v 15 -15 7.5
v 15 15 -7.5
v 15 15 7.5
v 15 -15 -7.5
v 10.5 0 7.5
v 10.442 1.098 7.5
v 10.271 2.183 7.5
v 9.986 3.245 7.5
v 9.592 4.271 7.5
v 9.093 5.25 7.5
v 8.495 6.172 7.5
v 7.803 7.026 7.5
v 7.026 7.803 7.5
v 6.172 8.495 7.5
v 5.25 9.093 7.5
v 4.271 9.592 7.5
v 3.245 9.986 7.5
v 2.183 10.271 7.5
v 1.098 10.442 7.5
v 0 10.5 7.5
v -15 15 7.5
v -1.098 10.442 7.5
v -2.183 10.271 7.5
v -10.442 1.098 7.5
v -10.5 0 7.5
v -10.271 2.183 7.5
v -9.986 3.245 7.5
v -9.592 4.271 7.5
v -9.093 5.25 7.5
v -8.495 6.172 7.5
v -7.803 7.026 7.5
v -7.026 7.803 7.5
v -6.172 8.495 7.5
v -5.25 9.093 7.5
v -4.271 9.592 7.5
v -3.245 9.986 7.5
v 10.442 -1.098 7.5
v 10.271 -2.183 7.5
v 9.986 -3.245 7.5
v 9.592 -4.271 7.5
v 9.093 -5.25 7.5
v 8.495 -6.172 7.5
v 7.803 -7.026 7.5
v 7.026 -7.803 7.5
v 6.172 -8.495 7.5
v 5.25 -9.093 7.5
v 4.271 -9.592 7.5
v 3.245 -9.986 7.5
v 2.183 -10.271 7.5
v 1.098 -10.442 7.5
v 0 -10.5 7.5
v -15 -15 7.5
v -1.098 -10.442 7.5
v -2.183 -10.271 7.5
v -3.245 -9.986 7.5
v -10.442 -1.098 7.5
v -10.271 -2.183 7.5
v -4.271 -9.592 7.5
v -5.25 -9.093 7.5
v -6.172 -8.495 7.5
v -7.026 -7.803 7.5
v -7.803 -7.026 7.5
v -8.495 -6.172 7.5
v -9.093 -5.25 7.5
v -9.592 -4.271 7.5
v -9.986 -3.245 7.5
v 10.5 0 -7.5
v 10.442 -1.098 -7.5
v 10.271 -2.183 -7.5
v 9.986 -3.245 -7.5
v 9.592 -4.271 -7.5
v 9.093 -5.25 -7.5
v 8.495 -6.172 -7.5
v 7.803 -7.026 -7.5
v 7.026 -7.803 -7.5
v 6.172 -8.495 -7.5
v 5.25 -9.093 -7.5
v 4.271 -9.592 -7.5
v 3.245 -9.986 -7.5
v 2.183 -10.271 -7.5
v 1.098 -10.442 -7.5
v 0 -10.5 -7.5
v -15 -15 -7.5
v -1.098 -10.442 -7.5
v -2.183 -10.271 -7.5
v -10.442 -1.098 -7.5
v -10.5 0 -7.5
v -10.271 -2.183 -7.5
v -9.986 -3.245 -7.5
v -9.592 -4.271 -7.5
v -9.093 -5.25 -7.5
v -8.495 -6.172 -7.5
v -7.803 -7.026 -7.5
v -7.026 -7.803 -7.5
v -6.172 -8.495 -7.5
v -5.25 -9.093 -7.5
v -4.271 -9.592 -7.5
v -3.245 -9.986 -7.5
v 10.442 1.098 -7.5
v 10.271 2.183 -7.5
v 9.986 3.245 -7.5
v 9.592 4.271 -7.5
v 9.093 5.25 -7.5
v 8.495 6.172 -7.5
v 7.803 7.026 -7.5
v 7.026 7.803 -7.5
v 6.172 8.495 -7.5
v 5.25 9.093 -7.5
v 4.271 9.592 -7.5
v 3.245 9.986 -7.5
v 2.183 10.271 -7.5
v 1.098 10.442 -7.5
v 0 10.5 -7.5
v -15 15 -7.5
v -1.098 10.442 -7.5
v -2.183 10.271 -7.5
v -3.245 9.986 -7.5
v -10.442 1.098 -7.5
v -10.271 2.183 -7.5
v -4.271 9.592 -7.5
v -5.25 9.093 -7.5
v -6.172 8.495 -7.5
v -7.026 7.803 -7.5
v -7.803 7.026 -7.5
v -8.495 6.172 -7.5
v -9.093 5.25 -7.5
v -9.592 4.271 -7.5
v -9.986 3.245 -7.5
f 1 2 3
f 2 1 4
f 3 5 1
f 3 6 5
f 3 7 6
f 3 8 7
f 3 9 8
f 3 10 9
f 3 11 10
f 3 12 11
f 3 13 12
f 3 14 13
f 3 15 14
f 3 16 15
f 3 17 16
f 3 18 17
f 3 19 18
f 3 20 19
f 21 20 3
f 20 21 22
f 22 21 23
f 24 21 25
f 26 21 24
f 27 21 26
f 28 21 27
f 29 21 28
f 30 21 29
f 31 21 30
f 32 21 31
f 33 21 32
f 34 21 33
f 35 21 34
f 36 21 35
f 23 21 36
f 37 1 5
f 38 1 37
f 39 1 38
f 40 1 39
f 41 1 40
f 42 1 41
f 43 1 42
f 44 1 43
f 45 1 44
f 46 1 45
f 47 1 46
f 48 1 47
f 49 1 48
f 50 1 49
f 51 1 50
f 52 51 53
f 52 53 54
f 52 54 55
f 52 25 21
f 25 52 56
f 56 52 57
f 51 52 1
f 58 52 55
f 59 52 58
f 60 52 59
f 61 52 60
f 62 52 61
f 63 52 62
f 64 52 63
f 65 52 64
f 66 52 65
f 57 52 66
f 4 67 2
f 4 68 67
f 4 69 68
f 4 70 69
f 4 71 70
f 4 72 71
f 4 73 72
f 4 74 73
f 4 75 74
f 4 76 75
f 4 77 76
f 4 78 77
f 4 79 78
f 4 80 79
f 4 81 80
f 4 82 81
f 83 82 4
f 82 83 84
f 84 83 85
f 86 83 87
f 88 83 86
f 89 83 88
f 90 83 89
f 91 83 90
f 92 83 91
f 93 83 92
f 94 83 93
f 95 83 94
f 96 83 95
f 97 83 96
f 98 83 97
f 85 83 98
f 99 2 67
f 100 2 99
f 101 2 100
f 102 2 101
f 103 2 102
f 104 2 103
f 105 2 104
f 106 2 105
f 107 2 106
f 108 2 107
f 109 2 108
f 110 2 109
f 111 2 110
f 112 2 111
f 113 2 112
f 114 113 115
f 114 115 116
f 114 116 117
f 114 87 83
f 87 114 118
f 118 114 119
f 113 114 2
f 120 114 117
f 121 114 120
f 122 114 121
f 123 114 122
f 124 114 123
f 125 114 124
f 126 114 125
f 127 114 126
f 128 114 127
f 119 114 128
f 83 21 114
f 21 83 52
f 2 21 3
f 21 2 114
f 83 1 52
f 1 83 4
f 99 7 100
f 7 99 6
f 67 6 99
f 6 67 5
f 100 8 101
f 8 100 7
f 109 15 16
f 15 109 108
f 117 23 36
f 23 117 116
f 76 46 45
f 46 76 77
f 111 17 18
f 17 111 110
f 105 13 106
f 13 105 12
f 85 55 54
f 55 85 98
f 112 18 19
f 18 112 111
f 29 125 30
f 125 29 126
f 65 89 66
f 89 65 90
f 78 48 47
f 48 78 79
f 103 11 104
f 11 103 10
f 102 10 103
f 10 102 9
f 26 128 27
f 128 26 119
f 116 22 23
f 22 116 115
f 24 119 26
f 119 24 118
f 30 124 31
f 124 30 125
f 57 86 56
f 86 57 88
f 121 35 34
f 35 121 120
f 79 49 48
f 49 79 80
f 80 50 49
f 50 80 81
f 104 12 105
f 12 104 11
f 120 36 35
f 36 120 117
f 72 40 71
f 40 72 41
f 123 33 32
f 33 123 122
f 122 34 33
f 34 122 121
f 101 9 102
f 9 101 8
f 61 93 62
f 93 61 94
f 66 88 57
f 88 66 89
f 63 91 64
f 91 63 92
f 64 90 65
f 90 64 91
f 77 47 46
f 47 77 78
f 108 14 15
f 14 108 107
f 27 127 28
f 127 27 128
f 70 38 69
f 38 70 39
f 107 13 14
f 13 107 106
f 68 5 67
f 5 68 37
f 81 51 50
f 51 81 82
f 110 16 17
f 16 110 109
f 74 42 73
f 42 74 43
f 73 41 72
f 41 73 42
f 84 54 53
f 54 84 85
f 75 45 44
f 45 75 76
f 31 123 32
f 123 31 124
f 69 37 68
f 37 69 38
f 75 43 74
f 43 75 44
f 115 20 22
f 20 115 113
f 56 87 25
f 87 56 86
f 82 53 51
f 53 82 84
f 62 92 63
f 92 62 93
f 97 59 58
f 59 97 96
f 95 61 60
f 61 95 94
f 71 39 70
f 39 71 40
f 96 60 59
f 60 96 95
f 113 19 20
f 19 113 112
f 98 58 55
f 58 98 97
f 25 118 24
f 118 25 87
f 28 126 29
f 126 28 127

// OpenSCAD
// Square nut.
$fn = 60;
eps = 0.02;
thread_d = 21;
side = 30;
thickness = 15;
difference() {
    cube([side, side, thickness], center = true);
    translate([0, 0, -thickness / 2 - eps]) cylinder(d = thread_d, h = thickness + 2 * eps);
}
